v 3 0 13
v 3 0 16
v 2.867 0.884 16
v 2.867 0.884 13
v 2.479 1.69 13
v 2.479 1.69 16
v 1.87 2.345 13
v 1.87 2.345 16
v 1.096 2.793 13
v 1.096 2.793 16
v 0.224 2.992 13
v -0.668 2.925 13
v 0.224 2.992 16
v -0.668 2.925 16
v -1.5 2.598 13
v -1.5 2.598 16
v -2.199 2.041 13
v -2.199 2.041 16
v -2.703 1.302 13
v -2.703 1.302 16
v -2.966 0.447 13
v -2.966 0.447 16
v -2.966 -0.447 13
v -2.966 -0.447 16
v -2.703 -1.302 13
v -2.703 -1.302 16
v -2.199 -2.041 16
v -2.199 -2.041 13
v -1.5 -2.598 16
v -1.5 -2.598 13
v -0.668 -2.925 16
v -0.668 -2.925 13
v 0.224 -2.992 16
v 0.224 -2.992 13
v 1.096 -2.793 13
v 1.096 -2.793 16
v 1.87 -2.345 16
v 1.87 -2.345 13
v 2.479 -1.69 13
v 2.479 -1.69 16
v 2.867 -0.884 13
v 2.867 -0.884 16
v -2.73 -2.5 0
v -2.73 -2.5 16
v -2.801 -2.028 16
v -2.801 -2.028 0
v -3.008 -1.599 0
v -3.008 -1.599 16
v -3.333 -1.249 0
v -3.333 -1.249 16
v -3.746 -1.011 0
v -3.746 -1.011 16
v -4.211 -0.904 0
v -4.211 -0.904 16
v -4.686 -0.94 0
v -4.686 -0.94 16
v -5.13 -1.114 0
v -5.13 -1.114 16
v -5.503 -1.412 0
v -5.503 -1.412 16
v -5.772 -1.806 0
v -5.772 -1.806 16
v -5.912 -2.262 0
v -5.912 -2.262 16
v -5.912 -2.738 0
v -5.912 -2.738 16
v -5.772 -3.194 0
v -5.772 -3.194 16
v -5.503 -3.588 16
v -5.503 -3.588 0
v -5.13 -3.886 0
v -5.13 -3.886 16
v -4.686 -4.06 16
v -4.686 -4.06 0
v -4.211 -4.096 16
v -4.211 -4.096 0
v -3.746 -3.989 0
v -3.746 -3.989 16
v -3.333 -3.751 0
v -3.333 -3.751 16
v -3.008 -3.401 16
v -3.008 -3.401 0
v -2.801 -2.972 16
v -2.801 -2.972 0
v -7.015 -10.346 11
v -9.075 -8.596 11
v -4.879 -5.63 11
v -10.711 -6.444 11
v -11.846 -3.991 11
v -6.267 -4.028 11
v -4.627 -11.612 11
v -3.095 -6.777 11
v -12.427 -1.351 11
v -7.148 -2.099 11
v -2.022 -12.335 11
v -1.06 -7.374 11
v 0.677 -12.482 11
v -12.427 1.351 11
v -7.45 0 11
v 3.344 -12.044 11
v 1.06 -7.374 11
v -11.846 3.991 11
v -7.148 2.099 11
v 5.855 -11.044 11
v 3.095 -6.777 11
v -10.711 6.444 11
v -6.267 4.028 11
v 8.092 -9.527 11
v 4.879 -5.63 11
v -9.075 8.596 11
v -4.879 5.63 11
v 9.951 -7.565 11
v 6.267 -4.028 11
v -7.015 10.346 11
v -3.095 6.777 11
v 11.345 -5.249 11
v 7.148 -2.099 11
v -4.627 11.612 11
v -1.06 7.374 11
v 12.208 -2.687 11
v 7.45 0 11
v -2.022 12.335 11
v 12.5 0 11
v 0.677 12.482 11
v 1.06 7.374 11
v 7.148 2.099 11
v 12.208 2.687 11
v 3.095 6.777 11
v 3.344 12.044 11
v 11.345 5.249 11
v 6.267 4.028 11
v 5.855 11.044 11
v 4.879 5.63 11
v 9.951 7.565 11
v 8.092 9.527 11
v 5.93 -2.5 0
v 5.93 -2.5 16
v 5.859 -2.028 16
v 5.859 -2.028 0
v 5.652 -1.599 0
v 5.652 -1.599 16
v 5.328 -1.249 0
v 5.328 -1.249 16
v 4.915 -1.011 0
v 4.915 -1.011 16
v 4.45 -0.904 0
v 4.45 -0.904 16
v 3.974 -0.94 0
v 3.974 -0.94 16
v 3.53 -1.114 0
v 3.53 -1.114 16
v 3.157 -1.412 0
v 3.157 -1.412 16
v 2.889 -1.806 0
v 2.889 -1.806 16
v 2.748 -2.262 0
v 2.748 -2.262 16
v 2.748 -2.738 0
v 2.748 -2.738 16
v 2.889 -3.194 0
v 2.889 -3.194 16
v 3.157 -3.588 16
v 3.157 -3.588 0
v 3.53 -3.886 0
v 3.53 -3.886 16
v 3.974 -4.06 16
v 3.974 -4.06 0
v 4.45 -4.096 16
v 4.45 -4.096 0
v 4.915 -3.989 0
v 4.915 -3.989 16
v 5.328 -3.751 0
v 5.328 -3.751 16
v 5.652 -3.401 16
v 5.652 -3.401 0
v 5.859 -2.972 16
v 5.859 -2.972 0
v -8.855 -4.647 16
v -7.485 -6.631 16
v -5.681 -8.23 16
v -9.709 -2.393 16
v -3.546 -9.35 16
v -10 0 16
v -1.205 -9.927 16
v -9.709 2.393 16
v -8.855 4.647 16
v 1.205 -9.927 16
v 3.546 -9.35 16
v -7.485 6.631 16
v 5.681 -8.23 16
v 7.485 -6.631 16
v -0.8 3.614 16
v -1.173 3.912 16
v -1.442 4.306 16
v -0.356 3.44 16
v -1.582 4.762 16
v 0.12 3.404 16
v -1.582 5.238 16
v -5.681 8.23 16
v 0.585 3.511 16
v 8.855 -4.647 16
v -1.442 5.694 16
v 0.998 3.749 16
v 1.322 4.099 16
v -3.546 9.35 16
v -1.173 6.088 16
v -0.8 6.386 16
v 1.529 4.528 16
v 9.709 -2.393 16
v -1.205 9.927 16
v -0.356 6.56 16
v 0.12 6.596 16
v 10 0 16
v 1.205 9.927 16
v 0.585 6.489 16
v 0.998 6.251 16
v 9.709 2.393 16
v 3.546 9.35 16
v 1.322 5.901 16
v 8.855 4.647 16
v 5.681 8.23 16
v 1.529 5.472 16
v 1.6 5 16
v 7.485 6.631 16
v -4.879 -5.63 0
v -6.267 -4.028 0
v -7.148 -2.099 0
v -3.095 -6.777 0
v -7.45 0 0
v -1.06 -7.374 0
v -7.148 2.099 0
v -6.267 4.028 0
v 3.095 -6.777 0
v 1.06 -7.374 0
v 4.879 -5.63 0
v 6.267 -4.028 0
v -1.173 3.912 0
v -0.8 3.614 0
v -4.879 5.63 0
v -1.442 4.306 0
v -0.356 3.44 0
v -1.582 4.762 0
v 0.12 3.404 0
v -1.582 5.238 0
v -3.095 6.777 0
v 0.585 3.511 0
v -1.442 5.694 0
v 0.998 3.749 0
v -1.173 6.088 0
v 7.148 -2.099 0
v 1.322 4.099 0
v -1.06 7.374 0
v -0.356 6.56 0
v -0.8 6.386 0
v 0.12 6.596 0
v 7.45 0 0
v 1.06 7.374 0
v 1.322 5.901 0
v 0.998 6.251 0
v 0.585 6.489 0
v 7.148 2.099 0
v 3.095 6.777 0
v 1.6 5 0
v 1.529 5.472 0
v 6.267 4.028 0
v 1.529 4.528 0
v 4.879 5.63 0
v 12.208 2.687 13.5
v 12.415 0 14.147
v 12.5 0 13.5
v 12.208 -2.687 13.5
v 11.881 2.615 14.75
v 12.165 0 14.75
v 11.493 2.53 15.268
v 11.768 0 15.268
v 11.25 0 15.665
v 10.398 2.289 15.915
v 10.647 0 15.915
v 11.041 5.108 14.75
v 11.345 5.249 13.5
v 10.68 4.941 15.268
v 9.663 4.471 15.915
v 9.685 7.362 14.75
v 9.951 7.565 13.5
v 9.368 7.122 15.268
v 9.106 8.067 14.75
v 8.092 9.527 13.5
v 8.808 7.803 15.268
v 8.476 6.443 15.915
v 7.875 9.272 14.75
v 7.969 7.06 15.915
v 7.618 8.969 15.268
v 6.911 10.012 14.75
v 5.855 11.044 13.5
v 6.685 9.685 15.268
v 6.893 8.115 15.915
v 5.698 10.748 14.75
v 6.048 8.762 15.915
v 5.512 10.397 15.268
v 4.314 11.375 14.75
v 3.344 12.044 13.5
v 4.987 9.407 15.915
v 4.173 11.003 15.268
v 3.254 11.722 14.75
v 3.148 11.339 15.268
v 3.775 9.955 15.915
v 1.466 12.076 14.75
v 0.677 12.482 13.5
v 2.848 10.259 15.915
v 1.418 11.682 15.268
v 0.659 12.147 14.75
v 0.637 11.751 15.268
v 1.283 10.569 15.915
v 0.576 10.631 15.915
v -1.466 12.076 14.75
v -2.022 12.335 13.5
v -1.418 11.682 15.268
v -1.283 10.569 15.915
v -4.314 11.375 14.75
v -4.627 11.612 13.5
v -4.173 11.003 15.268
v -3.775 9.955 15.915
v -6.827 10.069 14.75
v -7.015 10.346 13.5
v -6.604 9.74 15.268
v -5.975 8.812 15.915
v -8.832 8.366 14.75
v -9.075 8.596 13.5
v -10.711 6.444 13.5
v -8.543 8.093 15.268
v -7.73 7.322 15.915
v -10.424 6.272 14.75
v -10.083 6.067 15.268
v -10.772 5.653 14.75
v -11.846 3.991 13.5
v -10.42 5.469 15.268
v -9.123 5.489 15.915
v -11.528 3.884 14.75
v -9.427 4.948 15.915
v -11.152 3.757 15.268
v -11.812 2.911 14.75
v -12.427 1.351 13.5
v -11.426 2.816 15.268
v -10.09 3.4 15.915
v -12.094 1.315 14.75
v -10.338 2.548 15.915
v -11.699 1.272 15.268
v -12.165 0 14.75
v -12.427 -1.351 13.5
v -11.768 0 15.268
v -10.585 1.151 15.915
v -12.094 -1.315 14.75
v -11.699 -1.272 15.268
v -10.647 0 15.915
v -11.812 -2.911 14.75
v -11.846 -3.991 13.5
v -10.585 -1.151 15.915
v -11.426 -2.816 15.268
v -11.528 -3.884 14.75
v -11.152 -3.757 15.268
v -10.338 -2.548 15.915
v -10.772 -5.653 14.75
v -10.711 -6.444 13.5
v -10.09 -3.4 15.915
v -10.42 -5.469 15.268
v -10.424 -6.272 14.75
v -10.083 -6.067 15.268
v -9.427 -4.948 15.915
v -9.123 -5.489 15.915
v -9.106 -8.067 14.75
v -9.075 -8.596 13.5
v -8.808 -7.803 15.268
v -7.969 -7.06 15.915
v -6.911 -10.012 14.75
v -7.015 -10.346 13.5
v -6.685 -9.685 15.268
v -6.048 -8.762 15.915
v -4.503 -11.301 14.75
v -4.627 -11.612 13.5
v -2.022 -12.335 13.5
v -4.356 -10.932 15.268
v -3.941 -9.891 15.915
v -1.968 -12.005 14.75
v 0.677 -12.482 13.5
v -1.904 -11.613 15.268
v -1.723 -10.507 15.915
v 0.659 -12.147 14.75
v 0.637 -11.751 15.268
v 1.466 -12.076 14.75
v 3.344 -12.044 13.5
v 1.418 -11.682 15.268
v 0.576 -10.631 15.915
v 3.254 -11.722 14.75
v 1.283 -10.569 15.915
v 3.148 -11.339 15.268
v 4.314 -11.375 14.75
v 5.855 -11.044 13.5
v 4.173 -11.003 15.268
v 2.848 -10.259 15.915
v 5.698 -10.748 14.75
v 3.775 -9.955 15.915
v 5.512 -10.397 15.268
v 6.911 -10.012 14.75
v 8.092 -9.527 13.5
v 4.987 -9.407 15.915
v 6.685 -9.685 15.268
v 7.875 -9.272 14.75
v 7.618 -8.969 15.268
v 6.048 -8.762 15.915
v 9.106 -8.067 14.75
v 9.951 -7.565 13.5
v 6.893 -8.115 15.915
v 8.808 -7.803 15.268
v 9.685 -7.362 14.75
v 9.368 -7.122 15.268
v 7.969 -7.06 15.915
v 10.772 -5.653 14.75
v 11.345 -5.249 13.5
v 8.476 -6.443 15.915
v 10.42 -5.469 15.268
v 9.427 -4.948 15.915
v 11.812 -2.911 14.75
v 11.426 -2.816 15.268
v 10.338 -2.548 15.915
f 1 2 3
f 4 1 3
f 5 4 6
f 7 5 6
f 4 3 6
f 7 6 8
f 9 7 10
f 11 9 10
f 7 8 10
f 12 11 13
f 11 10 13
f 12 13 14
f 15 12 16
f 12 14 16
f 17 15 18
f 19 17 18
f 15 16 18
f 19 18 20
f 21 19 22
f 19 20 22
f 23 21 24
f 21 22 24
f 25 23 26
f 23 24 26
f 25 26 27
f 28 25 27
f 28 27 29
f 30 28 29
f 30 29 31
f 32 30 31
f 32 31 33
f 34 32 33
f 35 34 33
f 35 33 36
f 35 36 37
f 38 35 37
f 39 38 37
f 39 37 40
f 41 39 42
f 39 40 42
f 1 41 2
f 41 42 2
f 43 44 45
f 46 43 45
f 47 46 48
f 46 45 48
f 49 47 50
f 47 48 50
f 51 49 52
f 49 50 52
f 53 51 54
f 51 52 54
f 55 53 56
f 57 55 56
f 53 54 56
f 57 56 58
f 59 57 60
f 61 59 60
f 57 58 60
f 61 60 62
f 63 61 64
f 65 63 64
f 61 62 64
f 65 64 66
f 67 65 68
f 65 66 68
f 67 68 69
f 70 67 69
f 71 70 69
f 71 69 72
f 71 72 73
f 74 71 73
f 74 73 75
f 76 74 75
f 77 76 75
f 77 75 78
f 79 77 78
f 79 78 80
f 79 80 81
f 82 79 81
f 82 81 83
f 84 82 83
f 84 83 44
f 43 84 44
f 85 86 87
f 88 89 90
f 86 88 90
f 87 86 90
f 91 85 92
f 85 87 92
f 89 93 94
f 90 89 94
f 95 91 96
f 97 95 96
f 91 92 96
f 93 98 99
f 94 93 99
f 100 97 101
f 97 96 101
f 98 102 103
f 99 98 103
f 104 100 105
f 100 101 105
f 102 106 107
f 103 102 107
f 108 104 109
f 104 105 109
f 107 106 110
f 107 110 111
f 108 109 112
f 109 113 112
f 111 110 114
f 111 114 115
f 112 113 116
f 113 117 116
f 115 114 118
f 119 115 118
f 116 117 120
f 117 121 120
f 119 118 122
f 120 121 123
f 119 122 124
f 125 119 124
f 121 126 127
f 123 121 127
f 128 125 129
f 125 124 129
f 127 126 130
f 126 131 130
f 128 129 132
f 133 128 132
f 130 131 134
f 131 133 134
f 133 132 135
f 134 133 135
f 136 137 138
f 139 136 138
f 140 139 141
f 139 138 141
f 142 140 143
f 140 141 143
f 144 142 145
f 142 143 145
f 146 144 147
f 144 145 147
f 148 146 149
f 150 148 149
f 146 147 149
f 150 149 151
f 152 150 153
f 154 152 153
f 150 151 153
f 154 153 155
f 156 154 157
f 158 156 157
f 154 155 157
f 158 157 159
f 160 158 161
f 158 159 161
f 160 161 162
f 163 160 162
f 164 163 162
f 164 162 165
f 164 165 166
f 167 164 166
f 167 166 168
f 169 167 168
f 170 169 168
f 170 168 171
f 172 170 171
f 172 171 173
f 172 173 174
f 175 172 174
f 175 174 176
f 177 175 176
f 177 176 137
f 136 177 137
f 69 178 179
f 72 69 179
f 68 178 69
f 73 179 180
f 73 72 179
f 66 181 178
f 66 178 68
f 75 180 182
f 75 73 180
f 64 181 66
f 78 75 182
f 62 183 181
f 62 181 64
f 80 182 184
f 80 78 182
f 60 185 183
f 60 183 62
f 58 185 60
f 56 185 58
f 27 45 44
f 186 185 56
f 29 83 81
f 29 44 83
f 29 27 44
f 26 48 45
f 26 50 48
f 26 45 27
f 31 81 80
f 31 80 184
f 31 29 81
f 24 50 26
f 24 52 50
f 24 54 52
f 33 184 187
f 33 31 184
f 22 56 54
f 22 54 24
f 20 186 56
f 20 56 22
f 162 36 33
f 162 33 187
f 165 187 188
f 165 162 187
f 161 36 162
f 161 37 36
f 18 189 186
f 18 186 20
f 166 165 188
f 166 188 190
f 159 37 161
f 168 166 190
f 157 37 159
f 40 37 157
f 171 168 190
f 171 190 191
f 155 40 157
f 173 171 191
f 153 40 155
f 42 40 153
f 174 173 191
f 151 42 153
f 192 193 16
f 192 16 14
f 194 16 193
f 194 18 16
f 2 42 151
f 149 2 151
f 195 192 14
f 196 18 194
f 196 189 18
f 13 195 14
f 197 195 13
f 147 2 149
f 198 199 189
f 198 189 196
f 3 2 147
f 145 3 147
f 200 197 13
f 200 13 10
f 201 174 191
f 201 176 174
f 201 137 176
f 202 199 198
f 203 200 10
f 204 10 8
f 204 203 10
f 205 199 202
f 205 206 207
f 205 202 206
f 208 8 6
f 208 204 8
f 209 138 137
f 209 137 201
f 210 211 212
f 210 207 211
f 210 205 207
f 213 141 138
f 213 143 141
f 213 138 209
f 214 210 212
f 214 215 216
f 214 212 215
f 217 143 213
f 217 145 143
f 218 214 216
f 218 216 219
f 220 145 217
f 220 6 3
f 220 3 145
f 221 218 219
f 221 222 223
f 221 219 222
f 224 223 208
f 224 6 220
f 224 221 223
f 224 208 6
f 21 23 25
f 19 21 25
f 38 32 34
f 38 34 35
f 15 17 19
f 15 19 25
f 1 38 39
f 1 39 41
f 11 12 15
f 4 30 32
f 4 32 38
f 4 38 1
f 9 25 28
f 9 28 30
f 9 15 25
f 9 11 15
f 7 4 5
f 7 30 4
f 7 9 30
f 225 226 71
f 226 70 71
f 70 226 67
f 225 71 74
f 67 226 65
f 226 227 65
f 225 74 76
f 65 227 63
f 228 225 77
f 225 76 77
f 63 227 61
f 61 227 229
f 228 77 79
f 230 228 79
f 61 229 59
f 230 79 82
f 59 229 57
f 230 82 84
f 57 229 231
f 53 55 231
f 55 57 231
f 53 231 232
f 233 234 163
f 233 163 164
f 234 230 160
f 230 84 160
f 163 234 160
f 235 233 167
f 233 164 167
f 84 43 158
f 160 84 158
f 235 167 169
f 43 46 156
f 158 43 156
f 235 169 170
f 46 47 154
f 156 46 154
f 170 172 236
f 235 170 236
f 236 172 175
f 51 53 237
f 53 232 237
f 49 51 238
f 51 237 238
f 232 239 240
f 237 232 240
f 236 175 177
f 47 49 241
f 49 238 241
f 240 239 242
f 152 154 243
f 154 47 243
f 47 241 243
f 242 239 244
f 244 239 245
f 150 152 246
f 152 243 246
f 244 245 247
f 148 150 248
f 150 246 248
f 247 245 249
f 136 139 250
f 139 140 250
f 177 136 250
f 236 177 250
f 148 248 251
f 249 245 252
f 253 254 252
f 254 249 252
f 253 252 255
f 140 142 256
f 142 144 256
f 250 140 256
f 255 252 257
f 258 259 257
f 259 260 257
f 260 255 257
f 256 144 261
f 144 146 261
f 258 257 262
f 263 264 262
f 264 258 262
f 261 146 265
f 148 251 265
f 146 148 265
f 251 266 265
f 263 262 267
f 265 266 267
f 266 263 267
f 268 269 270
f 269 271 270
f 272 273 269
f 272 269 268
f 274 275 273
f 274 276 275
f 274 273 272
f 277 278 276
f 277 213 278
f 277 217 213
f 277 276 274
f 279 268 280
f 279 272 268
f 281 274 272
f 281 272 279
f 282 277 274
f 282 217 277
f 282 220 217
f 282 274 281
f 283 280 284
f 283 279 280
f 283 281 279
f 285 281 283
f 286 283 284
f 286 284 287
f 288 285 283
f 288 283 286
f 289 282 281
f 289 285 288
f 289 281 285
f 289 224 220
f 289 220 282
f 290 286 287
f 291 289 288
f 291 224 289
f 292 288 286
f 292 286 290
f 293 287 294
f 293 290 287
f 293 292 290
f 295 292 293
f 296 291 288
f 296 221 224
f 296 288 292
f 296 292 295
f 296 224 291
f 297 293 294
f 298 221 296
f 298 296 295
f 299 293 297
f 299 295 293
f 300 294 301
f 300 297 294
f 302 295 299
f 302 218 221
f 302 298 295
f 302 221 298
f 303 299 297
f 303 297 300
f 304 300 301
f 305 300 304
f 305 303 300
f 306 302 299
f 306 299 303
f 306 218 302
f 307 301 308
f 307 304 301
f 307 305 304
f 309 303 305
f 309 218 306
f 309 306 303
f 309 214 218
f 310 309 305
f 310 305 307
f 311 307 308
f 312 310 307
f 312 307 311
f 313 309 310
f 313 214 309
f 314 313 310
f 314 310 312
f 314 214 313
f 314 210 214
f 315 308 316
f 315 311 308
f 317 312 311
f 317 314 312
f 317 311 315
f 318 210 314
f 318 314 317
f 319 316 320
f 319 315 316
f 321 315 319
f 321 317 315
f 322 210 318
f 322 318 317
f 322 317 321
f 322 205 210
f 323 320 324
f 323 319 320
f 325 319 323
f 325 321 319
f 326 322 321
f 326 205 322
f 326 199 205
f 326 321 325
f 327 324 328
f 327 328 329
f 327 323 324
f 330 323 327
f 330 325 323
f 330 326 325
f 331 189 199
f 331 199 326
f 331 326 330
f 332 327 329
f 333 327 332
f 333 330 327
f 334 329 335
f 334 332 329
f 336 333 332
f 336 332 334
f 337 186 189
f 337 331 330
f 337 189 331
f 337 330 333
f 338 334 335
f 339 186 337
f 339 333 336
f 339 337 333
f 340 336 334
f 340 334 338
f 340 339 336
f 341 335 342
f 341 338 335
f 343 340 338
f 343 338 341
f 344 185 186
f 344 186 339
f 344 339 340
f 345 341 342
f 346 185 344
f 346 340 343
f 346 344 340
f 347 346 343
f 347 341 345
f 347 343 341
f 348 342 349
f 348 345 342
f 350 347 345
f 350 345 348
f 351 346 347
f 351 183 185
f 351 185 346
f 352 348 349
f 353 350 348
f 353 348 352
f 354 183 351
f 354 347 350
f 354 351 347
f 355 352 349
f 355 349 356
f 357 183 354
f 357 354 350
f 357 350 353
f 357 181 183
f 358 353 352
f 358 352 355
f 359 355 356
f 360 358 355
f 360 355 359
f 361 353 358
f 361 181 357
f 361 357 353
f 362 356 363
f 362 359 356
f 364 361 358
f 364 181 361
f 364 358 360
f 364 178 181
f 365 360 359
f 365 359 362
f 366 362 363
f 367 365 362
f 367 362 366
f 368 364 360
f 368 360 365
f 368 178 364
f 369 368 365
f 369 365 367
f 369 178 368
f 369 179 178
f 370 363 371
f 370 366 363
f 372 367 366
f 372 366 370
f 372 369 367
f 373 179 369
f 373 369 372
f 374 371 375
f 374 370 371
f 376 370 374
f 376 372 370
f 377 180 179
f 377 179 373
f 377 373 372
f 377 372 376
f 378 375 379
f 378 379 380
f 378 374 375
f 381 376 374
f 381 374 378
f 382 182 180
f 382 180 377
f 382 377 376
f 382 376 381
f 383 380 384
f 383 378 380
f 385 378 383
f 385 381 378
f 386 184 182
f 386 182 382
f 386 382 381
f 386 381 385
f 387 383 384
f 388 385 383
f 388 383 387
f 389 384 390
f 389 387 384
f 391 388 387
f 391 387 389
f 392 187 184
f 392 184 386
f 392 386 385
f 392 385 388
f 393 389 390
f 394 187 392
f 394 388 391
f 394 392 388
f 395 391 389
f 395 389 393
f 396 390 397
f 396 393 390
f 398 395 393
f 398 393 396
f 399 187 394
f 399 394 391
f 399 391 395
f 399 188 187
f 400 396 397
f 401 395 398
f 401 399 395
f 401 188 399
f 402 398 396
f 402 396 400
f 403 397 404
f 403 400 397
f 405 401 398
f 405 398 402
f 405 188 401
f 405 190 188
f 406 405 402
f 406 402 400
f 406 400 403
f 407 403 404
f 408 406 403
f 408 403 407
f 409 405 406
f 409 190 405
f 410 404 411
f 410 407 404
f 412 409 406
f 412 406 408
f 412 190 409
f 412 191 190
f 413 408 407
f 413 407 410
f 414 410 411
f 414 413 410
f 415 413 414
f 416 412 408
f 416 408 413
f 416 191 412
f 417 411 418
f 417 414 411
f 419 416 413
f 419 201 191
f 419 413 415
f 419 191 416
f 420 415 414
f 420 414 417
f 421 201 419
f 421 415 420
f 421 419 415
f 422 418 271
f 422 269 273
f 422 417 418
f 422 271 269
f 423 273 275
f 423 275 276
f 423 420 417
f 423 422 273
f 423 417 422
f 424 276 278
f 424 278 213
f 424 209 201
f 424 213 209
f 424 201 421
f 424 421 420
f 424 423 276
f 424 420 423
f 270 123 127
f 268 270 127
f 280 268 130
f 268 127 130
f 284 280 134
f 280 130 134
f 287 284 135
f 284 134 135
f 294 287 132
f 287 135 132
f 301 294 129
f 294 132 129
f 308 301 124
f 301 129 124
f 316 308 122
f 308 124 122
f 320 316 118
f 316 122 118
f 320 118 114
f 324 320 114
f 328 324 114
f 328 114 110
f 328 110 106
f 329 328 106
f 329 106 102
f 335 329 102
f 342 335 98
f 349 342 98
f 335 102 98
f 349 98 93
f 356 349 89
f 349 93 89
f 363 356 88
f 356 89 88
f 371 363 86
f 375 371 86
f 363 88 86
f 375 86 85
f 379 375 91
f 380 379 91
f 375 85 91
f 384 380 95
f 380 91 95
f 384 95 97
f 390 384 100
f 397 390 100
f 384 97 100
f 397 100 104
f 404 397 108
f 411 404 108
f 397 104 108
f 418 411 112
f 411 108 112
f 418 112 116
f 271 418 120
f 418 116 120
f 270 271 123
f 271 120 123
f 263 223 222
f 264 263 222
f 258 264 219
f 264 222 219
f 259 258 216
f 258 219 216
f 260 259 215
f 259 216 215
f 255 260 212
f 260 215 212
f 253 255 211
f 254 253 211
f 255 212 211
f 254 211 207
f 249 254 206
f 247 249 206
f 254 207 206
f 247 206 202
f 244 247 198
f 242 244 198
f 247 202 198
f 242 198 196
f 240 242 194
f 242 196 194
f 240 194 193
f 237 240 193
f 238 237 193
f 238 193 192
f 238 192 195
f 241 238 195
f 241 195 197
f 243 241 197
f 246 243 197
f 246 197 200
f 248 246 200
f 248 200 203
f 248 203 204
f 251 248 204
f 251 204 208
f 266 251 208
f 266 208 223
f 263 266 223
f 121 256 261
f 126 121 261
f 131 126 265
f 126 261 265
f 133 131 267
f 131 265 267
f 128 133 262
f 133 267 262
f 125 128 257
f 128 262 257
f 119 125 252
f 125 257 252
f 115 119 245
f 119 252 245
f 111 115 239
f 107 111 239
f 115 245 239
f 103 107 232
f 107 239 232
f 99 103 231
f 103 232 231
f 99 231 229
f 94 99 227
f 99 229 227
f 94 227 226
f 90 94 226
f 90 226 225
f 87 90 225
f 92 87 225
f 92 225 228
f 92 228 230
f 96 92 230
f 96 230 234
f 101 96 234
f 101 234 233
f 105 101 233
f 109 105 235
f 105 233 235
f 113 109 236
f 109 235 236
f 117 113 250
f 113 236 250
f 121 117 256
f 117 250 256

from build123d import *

# Parameters (mm, degrees)
SKETCH2_R           = 7.45
BOSS_EXTRUDE1_DEPTH = 11
SKETCH3_R           = 12.5
BOSS_EXTRUDE2_DEPTH = 5
SKETCH4_R           = 1.6
CUT_EXTRUDE1_DEPTH  = 24.843238035
FILLET2_R           = 2.5
SKETCH5_R           = 3
CUT_EXTRUDE2_DEPTH  = 3


with BuildPart() as part:
    # Sketch2 → Boss-Extrude1 (new body)
    with BuildSketch(Plane.XY):
        Circle(SKETCH2_R)
    extrude(amount=BOSS_EXTRUDE1_DEPTH)

    # Sketch3 → Boss-Extrude2 (add)
    with BuildSketch(Plane.XY.offset(11)):
        Circle(SKETCH3_R)
    extrude(amount=BOSS_EXTRUDE2_DEPTH)

    # Sketch4 → Cut-Extrude1 (cut, through all)
    with BuildSketch(Plane.XY.offset(16)):
        with Locations((0, 5)):
            Circle(SKETCH4_R)
        with Locations((4.330127019, -2.5)):
            Circle(SKETCH4_R)
        with Locations((-4.330127019, -2.5)):
            Circle(SKETCH4_R)
    extrude(amount=-CUT_EXTRUDE1_DEPTH, mode=Mode.SUBTRACT)

    # Fillet2
    fillet2_edges = [part.edges().sort_by_distance(p)[0] for p in [
        (-12.5, 0, 16),
    ]]
    fillet(fillet2_edges, radius=FILLET2_R)

    # Sketch5 → Cut-Extrude2 (cut)
    with BuildSketch(Plane.XY.offset(16)):
        Circle(SKETCH5_R)
    extrude(amount=-CUT_EXTRUDE2_DEPTH, mode=Mode.SUBTRACT)


solid = part.part
